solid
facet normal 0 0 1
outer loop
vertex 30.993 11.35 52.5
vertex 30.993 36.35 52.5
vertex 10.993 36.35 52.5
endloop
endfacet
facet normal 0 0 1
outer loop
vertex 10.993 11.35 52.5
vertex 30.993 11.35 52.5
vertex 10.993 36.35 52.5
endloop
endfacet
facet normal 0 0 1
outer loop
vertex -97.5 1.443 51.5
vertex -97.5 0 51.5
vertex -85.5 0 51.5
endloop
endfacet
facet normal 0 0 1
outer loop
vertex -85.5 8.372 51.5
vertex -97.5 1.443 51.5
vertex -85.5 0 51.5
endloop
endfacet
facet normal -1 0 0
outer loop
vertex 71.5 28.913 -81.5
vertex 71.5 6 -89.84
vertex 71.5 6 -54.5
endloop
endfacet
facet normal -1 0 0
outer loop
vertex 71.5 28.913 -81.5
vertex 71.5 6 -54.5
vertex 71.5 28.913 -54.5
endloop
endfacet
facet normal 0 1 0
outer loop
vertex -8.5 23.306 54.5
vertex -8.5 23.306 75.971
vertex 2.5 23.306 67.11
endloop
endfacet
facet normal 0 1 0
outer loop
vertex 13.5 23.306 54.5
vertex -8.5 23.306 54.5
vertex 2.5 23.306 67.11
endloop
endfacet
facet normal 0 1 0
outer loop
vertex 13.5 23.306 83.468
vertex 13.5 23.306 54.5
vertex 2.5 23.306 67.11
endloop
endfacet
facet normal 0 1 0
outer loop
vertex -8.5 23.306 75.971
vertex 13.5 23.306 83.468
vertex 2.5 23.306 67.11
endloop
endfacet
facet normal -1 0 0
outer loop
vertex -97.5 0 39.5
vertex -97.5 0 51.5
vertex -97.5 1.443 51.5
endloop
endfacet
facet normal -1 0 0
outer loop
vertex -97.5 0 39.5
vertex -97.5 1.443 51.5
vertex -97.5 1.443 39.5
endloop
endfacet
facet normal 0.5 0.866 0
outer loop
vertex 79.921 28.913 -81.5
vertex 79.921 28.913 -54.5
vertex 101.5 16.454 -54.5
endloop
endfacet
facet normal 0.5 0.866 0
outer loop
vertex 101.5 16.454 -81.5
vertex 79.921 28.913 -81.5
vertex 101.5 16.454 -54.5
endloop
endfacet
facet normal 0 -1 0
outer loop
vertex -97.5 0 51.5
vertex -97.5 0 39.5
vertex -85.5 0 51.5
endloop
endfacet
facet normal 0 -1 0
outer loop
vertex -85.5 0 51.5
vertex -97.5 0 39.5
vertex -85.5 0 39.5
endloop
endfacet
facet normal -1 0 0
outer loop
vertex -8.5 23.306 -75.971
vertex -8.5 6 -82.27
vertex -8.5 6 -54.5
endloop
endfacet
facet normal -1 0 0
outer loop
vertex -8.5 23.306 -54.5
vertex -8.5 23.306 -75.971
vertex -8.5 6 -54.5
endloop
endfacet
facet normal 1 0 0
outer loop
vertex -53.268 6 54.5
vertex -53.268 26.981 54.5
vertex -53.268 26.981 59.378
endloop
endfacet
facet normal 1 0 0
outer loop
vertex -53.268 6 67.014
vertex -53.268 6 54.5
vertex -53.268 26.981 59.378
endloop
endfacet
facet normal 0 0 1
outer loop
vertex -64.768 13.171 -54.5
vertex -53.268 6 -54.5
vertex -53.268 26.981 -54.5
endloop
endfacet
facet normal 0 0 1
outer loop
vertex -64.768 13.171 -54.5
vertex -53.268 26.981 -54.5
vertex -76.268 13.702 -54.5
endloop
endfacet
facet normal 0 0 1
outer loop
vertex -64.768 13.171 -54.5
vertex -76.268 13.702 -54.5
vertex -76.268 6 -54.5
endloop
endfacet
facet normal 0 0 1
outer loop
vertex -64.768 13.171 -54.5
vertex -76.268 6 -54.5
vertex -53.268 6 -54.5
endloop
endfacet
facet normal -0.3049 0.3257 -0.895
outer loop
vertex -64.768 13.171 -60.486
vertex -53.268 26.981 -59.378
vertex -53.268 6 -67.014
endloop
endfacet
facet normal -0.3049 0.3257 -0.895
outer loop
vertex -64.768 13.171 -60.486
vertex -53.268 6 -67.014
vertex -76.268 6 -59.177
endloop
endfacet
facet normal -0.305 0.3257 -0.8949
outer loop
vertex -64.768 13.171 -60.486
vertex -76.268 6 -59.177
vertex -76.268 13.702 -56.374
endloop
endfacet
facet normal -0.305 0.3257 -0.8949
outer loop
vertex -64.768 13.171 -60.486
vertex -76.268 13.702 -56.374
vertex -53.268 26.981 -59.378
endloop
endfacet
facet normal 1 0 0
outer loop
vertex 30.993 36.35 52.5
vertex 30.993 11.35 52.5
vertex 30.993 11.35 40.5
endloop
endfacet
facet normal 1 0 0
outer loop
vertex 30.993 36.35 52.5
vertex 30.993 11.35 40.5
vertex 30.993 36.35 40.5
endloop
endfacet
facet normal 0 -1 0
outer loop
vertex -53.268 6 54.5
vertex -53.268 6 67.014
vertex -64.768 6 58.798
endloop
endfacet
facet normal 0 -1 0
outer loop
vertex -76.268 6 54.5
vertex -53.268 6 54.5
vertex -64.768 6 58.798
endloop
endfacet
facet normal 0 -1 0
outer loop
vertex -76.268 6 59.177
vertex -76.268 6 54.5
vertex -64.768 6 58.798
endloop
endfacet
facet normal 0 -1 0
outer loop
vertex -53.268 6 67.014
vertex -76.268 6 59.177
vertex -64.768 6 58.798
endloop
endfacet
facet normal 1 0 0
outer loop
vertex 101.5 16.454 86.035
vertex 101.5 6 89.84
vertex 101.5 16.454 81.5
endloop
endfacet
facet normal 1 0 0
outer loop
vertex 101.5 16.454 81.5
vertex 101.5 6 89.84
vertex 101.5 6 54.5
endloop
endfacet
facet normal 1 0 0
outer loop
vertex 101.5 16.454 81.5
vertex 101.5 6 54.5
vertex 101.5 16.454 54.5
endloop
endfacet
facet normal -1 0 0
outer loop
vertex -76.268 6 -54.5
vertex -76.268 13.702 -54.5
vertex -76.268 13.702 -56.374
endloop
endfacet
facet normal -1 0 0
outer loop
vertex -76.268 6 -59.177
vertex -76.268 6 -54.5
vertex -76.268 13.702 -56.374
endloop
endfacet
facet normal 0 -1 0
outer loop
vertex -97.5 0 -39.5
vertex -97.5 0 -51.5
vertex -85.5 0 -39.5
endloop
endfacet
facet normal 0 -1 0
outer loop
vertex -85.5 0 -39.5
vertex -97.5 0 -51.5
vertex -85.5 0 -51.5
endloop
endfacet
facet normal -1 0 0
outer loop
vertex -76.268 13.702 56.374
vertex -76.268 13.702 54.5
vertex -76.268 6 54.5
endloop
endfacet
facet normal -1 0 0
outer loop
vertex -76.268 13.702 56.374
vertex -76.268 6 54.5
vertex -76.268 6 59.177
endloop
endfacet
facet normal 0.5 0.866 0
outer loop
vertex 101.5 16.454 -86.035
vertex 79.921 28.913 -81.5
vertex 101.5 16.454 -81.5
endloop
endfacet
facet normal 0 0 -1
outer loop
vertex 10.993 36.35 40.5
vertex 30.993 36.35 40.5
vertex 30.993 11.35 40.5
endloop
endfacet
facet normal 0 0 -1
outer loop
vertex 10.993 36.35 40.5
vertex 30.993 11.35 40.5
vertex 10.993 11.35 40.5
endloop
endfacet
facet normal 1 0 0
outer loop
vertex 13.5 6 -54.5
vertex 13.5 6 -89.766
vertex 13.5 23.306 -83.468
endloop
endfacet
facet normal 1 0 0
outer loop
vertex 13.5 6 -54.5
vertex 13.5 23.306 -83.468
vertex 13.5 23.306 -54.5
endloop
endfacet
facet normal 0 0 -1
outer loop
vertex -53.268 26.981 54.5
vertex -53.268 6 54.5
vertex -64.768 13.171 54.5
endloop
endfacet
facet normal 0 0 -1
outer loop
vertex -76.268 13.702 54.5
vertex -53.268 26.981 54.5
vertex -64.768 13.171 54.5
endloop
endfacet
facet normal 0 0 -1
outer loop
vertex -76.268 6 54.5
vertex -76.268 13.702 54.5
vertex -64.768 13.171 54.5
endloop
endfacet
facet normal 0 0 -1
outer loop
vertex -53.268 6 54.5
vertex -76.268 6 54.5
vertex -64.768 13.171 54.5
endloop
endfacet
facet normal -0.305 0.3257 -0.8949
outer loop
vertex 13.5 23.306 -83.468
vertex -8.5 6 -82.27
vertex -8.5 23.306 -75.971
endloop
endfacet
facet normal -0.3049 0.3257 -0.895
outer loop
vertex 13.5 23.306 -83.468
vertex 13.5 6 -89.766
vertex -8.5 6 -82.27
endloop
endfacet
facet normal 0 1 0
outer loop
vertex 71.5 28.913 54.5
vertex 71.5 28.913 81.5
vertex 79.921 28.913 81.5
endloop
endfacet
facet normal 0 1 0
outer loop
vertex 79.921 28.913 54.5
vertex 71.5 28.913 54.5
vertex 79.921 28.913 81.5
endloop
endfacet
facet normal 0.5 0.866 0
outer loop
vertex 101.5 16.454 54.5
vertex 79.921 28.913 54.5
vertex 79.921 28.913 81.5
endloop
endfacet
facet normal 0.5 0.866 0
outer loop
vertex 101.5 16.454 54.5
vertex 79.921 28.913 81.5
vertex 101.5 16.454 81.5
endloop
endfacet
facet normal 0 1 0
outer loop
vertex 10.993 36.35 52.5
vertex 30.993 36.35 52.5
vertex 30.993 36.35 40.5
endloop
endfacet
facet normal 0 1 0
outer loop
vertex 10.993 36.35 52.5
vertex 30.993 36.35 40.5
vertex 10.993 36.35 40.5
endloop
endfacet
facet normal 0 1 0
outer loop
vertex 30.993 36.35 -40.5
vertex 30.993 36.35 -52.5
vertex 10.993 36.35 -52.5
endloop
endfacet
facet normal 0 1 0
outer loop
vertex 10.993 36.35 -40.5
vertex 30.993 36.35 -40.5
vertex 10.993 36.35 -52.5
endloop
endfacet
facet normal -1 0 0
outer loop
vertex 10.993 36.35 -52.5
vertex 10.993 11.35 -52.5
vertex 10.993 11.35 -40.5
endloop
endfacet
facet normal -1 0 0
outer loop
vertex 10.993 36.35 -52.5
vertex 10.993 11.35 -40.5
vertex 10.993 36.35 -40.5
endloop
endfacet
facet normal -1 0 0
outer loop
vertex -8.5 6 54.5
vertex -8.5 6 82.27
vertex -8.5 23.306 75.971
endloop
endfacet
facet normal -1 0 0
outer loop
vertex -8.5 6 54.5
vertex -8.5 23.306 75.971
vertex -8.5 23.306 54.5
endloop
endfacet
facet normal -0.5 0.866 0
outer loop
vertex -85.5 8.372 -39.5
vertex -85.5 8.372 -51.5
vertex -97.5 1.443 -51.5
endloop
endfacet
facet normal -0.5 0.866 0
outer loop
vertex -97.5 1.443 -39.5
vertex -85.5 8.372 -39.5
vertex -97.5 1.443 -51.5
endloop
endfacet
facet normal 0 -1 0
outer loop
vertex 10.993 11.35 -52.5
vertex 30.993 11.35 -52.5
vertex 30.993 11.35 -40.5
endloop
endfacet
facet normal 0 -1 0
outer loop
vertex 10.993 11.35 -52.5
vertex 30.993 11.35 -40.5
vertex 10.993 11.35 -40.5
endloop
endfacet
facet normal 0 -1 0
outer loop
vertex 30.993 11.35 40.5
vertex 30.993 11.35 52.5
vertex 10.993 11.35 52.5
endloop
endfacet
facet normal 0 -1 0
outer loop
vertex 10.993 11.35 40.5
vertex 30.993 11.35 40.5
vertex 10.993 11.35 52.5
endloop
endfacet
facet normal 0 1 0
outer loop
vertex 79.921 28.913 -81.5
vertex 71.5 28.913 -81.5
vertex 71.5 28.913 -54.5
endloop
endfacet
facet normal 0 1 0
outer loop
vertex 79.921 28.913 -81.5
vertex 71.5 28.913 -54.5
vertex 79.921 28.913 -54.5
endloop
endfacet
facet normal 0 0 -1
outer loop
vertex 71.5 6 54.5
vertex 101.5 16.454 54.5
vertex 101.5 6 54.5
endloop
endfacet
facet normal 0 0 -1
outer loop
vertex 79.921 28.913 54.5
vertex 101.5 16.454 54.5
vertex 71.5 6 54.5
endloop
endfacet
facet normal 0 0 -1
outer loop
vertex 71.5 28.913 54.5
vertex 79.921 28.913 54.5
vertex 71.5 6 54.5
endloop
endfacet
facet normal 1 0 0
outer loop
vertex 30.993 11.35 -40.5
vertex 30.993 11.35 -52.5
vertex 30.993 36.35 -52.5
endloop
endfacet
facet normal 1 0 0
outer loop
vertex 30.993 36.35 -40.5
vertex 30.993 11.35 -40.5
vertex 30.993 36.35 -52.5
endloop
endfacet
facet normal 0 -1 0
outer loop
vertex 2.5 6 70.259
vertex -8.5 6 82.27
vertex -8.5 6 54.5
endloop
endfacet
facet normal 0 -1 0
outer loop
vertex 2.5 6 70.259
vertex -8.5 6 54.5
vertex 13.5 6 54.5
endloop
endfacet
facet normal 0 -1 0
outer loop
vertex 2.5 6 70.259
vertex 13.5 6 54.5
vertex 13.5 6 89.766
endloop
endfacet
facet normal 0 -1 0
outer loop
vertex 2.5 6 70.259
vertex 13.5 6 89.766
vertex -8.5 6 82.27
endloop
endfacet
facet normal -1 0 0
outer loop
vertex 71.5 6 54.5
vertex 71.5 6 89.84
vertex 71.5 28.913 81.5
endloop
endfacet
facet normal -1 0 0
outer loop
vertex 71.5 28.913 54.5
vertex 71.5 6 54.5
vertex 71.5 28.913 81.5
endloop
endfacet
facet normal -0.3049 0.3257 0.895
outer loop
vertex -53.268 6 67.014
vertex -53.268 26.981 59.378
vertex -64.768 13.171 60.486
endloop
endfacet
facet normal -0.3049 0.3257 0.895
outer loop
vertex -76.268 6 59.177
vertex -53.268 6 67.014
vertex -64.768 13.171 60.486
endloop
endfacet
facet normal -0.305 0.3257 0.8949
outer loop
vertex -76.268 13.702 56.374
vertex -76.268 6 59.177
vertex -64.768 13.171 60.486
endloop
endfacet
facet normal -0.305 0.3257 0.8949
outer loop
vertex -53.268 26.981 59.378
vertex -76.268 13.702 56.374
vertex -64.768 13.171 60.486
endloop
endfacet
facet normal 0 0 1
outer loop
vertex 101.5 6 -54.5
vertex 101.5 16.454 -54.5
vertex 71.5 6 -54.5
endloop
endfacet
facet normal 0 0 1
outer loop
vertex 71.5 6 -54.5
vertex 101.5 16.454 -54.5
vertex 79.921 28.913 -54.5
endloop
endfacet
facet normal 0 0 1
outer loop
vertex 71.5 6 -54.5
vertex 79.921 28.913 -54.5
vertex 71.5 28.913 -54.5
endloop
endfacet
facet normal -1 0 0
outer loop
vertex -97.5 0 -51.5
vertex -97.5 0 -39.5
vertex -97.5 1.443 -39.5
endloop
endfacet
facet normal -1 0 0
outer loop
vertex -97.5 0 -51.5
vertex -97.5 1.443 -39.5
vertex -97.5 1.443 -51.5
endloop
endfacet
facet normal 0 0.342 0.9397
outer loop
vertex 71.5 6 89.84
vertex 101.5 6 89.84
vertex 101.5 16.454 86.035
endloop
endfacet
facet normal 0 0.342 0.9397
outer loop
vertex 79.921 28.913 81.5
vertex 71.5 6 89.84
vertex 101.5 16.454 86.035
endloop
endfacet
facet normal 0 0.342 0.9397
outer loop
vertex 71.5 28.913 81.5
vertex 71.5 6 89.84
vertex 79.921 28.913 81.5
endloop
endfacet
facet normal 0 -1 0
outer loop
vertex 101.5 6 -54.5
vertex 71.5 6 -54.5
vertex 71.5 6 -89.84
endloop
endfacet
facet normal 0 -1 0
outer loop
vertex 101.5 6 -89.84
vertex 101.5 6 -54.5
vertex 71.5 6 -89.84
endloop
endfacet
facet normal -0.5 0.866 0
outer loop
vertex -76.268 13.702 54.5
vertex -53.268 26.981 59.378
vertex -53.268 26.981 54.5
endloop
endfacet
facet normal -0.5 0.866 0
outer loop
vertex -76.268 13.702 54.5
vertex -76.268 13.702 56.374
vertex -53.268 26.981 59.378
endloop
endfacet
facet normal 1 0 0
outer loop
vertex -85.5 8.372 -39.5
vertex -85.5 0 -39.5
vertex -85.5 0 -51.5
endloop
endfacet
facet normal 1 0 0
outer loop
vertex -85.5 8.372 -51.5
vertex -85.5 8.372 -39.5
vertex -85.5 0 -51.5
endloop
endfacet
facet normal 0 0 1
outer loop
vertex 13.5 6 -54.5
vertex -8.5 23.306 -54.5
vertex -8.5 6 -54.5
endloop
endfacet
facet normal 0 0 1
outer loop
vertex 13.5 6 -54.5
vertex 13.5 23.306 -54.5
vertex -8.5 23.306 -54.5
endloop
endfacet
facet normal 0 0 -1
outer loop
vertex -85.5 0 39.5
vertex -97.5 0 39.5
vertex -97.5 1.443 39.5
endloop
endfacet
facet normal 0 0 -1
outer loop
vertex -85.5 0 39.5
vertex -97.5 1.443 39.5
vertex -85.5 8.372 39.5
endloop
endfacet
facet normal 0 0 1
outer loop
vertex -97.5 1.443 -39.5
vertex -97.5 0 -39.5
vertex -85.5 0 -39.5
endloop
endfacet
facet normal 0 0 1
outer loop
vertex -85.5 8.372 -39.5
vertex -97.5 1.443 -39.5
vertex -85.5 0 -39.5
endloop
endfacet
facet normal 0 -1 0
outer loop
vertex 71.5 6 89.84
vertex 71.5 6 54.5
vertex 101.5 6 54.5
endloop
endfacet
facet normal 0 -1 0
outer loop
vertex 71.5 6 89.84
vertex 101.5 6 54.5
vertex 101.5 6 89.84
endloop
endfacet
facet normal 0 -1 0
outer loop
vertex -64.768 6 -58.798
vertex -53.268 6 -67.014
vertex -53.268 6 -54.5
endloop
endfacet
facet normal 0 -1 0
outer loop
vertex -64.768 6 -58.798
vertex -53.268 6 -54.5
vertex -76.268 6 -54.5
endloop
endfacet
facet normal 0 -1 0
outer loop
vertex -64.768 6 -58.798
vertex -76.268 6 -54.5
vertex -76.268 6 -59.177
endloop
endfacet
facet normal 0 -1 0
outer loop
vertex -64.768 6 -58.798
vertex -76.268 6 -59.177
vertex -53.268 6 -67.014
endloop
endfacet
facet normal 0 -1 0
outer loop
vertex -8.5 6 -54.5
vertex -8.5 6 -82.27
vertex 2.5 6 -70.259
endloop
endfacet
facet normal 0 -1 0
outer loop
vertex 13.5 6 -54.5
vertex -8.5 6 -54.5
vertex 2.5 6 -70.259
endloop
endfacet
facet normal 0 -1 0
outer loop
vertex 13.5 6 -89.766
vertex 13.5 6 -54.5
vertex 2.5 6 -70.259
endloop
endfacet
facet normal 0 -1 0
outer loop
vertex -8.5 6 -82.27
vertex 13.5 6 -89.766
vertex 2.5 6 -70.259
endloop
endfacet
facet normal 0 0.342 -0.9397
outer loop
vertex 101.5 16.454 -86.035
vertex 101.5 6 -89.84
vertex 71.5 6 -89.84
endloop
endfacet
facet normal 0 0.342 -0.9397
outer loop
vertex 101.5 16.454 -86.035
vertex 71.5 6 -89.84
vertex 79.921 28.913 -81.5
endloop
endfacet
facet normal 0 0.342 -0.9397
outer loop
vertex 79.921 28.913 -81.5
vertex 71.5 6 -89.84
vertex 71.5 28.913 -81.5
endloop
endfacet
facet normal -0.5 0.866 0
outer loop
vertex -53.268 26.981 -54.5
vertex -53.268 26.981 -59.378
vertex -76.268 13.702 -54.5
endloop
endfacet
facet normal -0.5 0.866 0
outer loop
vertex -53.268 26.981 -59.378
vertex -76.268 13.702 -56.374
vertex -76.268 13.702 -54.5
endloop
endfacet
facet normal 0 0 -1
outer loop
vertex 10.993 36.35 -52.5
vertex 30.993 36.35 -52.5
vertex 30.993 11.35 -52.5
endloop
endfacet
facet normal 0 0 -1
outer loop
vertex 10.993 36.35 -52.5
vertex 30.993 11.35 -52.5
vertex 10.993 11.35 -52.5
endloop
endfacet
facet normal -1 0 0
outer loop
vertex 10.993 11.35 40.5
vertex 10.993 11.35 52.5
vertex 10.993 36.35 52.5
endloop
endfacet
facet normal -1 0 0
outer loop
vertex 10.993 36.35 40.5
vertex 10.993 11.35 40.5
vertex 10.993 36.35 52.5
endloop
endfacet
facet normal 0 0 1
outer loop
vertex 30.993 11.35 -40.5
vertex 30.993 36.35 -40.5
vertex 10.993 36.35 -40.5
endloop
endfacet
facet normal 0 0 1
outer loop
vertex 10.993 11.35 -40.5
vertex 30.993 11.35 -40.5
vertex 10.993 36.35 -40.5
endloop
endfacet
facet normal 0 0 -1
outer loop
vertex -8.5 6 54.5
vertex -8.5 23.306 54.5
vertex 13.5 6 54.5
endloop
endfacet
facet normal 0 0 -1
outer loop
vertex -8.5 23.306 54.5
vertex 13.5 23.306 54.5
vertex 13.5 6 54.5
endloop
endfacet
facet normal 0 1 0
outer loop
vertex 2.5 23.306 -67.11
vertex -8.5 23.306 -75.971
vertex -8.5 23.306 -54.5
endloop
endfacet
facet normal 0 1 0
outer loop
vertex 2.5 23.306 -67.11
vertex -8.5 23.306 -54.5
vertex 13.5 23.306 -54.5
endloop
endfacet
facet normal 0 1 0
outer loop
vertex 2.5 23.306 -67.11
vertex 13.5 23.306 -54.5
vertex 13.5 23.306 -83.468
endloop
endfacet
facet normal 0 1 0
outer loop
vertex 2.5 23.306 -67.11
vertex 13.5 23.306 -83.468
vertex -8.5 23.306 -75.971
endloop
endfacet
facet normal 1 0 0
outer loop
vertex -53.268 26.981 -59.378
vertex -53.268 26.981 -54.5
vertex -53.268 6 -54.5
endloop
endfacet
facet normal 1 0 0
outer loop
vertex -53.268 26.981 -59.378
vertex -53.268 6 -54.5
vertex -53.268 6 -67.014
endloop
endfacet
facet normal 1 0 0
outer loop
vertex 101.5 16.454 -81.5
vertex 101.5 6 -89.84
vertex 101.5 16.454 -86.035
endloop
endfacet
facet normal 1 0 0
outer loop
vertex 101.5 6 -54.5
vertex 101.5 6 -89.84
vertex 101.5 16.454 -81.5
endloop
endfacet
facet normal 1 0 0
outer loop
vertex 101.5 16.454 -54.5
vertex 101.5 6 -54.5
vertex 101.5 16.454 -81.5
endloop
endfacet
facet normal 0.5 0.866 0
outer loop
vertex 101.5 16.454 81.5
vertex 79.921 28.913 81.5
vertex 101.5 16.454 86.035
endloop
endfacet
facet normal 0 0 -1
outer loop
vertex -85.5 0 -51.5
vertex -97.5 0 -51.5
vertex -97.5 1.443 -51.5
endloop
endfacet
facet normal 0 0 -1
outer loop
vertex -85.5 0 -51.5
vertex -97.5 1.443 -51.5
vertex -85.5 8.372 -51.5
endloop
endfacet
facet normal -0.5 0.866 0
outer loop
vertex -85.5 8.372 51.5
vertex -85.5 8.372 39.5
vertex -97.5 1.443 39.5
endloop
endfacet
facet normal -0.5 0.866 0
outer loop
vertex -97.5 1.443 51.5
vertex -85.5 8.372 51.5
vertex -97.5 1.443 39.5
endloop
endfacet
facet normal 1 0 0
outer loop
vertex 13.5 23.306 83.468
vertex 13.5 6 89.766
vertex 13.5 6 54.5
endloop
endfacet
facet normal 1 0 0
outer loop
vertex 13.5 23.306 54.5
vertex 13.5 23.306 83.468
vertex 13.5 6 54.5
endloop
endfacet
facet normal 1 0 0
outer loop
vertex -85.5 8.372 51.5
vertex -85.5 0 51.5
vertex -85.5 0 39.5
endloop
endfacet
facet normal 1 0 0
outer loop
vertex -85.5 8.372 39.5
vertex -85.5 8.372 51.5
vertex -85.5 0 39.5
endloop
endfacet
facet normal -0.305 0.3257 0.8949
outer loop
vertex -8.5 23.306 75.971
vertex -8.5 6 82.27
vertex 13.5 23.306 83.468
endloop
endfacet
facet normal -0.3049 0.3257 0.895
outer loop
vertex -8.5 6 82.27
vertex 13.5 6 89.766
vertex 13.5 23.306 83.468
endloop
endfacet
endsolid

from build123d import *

# Parameters (mm, degrees)
BOSS_EXTRUDE8_DEPTH   = 27
BOSS_EXTRUDE8_START   = 71.5
BOSS_EXTRUDE8_2_DEPTH = 30
BOSS_EXTRUDE8_START_2 = 65
BOSS_EXTRUDE8_3_DEPTH = 12
BOSS_EXTRUDE9_REACH   = 140.598
SKETCH5_W             = 12
SKETCH5_H             = 12
SKETCH13_W            = 20
SKETCH13_H            = 25
BOSS_EXTRUDE10_DEPTH  = 12


with BuildPart() as part:
    # Boss-Extrude8: read off the stored shape, not the designer's step
    # Boss-Extrude8 outline → Boss-Extrude8 (new body)
    with BuildSketch(Plane(origin=(0, 0, -54.5), x_dir=(-1, 0, 0), z_dir=(0, 0, -1))):
        Polygon((-101.5, 16.454482672), (-101.5, 6), (-71.5, 6), (-71.5, 28.913219679), (-79.920834506, 28.913219679), align=None)
    extrude(amount=BOSS_EXTRUDE8_DEPTH)

    # Boss-Extrude8 2 outline → Boss-Extrude8 2 (add)
    with BuildSketch(Plane.YZ.offset(BOSS_EXTRUDE8_START)):
        Polygon((6, -89.839729934), (28.913219679, -81.5), (6, -81.5), align=None)
    extrude(amount=BOSS_EXTRUDE8_2_DEPTH)

    # Boss-Extrude8 3 outline → Boss-Extrude8 3 (cut)
    with BuildSketch(Plane(origin=(0, 0, 0), x_dir=(0.866025403784438, -0.500000000000001, 0), z_dir=(0.500000000000001, 0.866025403784438, 0)).offset(BOSS_EXTRUDE8_START_2)):
        Polygon((54.756863134, 54.5), (79.674337148, 54.5), (79.674337148, 86.034609427), (54.756863134, 81.5), align=None)
    extrude(amount=BOSS_EXTRUDE8_3_DEPTH, mode=Mode.SUBTRACT)


with BuildPart() as body_2:
    # Boss-Extrude8 4: loft between two sections, ruled curve by curve
    boss_extrude8_4_from = [
        Edge.make_line((-8.5, 6, -82.269580064), (-8.5, 23.305515956, -75.970887367)),
        Edge.make_line((-8.5, 6, -82.269580064), (-8.5, 6, -54.5)),
        Edge.make_line((-8.5, 23.305515956, -75.970887367), (-8.5, 23.305515956, -54.5)),
        Edge.make_line((-8.5, 23.305515956, -54.5), (-8.5, 6, -54.5)),
    ]
    boss_extrude8_4_to = [
        Edge.make_line((13.5, 6, -89.766381851), (13.5, 23.305515956, -83.467689154)),
        Edge.make_line((13.5, 6, -89.766381851), (13.5, 6, -54.5)),
        Edge.make_line((13.5, 23.305515956, -83.467689154), (13.5, 23.305515956, -54.5)),
        Edge.make_line((13.5, 23.305515956, -54.5), (13.5, 6, -54.5)),
    ]
    boss_extrude8_4 = Solid(Shell([*[Face.make_surface_from_curves(boss_extrude8_4_from[k], boss_extrude8_4_to[k]) for k in range(4)], Face(Wire(boss_extrude8_4_from)), Face(Wire(boss_extrude8_4_to))]))
    add(boss_extrude8_4)


with BuildPart() as body_3:
    # Boss-Extrude8 5: loft between two sections, ruled curve by curve
    boss_extrude8_5_from = [
        Edge.make_line((-53.267949192, 26.980762114, -59.377914368), (-53.267949192, 6, -67.01428727)),
        Edge.make_line((-53.267949192, 6, -67.01428727), (-53.267949192, 6, -54.5)),
        Edge.make_line((-53.267949192, 6, -54.5), (-53.267949192, 26.980762114, -54.5)),
        Edge.make_line((-53.267949192, 26.980762114, -59.377914368), (-53.267949192, 26.980762114, -54.5)),
    ]
    boss_extrude8_5_to = [
        Edge.make_line((-76.267949192, 13.701705922, -56.373530057), (-76.267949192, 6, -59.176721766)),
        Edge.make_line((-76.267949192, 6, -59.176721766), (-76.267949192, 6, -54.5)),
        Edge.make_line((-76.267949192, 6, -54.5), (-76.267949192, 13.701705922, -54.5)),
        Edge.make_line((-76.267949192, 13.701705922, -56.373530057), (-76.267949192, 13.701705922, -54.5)),
    ]
    boss_extrude8_5 = Solid(Shell([*[Face.make_surface_from_curves(boss_extrude8_5_from[k], boss_extrude8_5_to[k]) for k in range(4)], Face(Wire(boss_extrude8_5_from)), Face(Wire(boss_extrude8_5_to))]))
    add(boss_extrude8_5)


with BuildPart() as body_4:
    # Boss-Extrude9: up to this plane
    boss_extrude9_end = Plane(origin=(-37.039953145, 36.35, -52.5), z_dir=(0.4999999999999954, -0.8660254037844414, 0))
    # Sketch5 → Boss-Extrude9 (new, up to the surface)
    with BuildSketch(Plane(origin=(0, 0, 0), x_dir=(1, 0, 0), z_dir=(0, 1, 0)), mode=Mode.PRIVATE) as boss_extrude9_sk1:
        with Locations((-91.5, -45.5)):
            Rectangle(SKETCH5_W, SKETCH5_H)
    boss_extrude9_tool1 = split(extrude(boss_extrude9_sk1.sketch, amount=BOSS_EXTRUDE9_REACH, mode=Mode.PRIVATE), bisect_by=boss_extrude9_end, keep=Keep.BOTH, mode=Mode.PRIVATE)
    add(boss_extrude9_tool1.solids().sort_by_distance((-91.5, 0, 45.5))[0])
    # Sketch5 → Boss-Extrude9 (new, up to the surface)
    with BuildSketch(Plane(origin=(0, 0, 0), x_dir=(1, 0, 0), z_dir=(0, 1, 0)), mode=Mode.PRIVATE) as boss_extrude9_sk2:
        with Locations((-91.5, 45.5)):
            Rectangle(SKETCH5_W, SKETCH5_H)
    boss_extrude9_tool2 = split(extrude(boss_extrude9_sk2.sketch, amount=BOSS_EXTRUDE9_REACH, mode=Mode.PRIVATE), bisect_by=boss_extrude9_end, keep=Keep.BOTH, mode=Mode.PRIVATE)
    add(boss_extrude9_tool2.solids().sort_by_distance((-91.5, 0, -45.5))[0])


with BuildPart() as body_5:
    # Mirror3: mirrored copy
    add(body_2.part.mirror(Plane.XY))


with BuildPart() as body_6:
    # Mirror3 2: mirrored copy
    add(body_3.part.mirror(Plane.XY))


with BuildPart() as body_7:
    # Mirror3 3: mirrored copy
    add(part.part.mirror(Plane.XY))


with BuildPart() as body_8:
    # Sketch13 → Boss-Extrude10 (new body)
    with BuildSketch(Plane(origin=(0, 0, 52.5), x_dir=(-1, 0, 0), z_dir=(0, 0, -1))):
        with Locations((-20.992681083, 23.85)):
            Rectangle(SKETCH13_W, SKETCH13_H)
    extrude(amount=BOSS_EXTRUDE10_DEPTH)


with BuildPart() as body_9:
    # Mirror5: mirrored copy
    add(body_8.part.mirror(Plane.XY))


solid = Compound([part.part, body_2.part, body_3.part, body_4.part, body_5.part, body_6.part, body_7.part, body_8.part, body_9.part])
